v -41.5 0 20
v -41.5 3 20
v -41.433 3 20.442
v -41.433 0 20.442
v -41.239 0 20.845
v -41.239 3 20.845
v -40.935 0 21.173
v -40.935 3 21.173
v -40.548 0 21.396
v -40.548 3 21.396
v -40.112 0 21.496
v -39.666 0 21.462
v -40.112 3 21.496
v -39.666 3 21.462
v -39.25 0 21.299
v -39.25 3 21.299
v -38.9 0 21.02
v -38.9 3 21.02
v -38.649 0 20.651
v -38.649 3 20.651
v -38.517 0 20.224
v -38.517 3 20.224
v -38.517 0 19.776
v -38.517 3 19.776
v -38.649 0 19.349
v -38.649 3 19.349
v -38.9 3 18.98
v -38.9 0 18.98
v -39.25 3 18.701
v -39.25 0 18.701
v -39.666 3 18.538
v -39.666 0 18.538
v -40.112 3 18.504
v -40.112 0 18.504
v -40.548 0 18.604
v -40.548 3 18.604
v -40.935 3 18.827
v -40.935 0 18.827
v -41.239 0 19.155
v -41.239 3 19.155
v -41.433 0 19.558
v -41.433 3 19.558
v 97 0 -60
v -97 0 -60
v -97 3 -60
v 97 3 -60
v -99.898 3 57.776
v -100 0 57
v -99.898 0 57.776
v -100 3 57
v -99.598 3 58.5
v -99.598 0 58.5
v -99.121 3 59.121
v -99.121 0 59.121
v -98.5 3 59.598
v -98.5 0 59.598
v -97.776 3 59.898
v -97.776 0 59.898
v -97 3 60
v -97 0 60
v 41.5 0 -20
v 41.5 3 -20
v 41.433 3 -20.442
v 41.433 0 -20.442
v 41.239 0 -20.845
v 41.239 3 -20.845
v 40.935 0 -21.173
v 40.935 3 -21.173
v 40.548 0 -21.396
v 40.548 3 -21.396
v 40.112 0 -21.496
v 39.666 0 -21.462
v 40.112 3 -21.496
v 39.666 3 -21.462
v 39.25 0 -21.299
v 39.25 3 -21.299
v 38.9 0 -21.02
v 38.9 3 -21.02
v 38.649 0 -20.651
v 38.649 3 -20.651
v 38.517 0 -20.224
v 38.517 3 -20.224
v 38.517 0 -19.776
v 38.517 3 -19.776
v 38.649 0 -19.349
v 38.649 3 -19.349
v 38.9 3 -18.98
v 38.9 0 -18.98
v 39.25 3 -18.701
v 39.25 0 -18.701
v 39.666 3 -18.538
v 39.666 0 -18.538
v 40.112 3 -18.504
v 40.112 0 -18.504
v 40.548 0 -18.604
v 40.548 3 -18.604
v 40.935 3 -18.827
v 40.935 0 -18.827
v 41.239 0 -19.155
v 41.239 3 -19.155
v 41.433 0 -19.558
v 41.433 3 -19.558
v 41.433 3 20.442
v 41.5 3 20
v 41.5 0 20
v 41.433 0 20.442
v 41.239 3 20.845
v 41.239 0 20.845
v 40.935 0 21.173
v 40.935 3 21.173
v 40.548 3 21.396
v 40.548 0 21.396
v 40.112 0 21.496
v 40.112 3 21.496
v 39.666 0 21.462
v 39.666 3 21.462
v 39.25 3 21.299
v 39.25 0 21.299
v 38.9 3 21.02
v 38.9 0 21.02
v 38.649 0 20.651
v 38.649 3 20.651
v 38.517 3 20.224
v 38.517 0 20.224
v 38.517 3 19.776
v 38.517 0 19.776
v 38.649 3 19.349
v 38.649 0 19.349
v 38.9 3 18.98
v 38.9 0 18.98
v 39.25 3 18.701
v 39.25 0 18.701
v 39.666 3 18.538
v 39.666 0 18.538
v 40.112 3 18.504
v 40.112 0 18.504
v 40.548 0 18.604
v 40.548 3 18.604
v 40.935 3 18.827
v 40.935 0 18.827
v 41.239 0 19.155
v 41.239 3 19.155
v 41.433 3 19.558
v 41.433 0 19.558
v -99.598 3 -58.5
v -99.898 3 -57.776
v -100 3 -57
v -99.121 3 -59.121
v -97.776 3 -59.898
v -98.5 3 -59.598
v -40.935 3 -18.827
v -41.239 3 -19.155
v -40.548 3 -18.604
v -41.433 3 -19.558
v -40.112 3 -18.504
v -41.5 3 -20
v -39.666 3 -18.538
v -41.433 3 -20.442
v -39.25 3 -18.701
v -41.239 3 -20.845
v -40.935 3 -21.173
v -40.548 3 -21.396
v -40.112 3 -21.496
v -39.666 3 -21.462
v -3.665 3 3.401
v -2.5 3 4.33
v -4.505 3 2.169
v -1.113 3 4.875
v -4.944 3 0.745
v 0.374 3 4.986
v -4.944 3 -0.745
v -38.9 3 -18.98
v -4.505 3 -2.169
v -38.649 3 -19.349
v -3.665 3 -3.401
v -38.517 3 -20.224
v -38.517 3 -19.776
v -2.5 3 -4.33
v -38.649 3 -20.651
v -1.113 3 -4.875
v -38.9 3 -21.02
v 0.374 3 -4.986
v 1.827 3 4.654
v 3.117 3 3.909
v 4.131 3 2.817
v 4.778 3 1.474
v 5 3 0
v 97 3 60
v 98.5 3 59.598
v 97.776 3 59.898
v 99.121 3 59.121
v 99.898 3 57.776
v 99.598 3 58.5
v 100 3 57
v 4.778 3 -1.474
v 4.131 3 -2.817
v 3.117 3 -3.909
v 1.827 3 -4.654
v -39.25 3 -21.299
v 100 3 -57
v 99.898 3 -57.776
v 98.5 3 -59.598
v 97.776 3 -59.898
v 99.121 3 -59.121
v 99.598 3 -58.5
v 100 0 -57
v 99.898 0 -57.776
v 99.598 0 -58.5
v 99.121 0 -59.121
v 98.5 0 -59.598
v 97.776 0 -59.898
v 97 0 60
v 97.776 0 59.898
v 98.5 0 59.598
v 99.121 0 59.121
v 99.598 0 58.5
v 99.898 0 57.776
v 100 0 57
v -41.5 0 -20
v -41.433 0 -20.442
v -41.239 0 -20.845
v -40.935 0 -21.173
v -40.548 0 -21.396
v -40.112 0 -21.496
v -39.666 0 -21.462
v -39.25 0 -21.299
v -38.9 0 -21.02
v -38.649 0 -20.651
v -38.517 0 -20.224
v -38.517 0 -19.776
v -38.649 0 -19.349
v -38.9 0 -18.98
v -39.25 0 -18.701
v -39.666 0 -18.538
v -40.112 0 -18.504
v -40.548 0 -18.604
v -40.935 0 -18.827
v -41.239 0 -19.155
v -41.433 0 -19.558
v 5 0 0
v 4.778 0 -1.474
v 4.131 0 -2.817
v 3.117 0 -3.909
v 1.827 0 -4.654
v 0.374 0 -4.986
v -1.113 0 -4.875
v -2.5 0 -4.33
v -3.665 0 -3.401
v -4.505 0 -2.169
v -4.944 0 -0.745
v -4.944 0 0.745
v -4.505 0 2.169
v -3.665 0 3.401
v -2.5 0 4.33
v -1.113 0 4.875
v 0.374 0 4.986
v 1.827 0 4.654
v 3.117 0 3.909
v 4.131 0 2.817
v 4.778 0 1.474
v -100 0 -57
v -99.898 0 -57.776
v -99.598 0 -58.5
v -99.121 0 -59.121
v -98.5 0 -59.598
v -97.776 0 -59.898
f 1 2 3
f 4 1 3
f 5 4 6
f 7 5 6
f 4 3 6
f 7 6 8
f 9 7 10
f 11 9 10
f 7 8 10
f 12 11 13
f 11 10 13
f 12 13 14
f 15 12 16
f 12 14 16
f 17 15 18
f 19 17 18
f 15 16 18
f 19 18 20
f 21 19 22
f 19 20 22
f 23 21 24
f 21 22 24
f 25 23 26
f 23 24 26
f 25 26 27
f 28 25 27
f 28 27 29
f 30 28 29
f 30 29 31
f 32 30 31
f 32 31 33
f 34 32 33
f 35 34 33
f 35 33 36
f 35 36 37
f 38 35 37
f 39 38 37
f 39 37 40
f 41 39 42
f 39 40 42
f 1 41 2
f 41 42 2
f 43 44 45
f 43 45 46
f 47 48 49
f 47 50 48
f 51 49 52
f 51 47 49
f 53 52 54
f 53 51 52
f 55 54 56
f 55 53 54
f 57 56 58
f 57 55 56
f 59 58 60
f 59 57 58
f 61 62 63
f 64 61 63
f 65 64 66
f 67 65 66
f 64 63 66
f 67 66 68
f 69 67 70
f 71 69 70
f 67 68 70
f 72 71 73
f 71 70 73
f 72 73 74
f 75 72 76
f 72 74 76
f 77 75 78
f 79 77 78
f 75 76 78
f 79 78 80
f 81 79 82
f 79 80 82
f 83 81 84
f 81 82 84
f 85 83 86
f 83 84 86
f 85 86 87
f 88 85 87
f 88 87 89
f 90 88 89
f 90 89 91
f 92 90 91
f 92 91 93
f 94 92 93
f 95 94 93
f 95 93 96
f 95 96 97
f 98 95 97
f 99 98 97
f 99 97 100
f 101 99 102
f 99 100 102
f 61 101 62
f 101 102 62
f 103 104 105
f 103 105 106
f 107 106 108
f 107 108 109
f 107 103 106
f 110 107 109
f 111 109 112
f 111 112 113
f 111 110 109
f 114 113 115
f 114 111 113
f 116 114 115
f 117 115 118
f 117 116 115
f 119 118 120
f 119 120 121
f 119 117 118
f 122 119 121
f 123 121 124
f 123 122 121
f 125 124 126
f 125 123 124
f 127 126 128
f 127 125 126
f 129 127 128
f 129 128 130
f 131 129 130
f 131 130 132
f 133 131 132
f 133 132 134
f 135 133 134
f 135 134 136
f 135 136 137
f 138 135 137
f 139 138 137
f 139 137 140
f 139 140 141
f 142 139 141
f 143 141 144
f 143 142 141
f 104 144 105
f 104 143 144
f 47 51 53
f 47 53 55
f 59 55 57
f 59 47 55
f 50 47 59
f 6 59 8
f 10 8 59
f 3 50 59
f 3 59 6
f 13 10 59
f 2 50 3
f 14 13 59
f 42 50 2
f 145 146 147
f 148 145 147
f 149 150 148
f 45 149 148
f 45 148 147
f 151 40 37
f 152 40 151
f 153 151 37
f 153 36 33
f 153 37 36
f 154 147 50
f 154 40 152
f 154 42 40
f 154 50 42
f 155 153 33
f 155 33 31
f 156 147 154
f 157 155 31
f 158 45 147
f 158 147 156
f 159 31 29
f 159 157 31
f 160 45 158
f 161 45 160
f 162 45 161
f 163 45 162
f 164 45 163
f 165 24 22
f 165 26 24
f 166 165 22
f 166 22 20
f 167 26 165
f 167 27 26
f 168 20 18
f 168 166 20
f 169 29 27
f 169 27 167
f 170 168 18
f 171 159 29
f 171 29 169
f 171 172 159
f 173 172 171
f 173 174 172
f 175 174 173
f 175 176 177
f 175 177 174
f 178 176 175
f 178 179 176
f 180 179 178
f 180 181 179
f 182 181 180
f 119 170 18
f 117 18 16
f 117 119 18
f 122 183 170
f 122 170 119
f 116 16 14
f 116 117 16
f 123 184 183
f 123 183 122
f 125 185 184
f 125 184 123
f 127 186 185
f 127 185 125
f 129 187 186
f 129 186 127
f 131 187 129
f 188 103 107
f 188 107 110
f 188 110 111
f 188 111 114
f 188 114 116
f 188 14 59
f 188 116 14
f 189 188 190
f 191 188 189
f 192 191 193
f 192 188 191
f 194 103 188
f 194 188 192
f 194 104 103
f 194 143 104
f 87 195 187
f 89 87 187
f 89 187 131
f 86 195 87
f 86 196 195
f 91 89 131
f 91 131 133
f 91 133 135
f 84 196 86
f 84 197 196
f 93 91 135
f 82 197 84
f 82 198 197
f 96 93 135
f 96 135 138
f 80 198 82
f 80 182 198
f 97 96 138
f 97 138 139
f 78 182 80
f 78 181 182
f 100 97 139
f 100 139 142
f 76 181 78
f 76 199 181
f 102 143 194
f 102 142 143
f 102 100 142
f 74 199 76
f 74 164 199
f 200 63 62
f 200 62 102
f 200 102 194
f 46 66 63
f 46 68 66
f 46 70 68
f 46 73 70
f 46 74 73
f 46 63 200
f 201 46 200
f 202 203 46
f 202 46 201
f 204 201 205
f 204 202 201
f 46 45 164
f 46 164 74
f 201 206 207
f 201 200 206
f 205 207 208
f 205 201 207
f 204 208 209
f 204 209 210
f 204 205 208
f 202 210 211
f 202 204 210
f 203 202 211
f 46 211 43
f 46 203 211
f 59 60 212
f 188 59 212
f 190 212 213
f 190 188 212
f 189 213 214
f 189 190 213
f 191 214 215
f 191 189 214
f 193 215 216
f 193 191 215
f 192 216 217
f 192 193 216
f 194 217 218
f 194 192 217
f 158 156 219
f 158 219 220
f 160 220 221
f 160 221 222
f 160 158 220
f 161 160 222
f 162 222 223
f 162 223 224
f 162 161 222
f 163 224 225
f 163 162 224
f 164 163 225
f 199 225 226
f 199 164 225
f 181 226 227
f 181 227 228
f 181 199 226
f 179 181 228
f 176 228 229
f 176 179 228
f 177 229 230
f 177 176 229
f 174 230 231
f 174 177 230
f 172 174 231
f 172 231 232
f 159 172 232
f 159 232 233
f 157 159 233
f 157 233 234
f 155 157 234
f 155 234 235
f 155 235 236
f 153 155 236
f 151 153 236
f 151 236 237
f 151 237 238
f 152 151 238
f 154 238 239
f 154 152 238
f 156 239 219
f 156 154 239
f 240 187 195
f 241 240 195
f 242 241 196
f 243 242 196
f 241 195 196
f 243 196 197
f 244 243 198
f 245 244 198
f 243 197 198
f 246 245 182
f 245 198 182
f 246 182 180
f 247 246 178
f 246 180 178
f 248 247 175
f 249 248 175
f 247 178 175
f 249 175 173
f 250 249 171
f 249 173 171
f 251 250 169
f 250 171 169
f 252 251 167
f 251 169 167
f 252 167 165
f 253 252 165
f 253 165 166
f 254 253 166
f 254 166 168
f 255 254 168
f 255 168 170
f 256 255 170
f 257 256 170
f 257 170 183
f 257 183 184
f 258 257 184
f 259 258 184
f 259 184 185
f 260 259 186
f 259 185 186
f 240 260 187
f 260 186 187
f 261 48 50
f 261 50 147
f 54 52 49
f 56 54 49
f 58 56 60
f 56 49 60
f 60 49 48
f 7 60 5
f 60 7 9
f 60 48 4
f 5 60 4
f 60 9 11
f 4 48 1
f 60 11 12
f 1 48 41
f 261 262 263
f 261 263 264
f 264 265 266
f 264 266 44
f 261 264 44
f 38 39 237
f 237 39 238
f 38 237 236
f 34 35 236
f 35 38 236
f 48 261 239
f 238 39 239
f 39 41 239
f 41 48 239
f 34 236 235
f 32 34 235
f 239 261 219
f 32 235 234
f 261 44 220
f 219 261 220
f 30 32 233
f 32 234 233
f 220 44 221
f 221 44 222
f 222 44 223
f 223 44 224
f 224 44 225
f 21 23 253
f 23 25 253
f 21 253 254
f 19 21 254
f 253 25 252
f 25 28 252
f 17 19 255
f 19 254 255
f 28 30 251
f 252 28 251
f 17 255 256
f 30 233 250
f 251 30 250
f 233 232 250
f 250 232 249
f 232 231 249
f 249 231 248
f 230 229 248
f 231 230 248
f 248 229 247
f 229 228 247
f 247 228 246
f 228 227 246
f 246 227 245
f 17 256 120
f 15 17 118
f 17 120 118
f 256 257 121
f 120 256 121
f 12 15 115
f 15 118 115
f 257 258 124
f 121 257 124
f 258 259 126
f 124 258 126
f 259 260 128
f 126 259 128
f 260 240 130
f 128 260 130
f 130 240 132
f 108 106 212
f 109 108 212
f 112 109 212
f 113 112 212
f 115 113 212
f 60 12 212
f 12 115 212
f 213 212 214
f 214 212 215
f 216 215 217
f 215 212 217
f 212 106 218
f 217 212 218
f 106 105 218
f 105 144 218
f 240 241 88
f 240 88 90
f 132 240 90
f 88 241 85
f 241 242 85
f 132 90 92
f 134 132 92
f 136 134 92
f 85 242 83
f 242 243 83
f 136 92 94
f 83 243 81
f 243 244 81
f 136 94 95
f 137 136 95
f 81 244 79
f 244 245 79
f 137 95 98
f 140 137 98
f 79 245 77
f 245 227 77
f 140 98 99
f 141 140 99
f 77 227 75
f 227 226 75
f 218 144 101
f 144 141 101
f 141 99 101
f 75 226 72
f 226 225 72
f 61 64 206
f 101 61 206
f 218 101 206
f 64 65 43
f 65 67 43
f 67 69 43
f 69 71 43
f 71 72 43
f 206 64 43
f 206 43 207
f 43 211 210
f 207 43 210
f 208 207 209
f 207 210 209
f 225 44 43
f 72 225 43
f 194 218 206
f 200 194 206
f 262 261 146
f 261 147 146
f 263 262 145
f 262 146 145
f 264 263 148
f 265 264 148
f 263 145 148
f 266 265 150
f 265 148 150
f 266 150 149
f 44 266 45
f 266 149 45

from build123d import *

# Parameters (mm, degrees)
SKETCH1_W               = 200
SKETCH1_H               = 120
BOSS_EXTRUDE1_DEPTH     = 3
FILLET1_R               = 3
SKETCH2_R               = 1.5
CUT_EXTRUDE1_DEPTH      = 3
MIRROR2_COPY_1_SKETCH_R = 1.5
MIRROR2_COPY_1_DEPTH    = 3
SKETCH3_R               = 5
CUT_EXTRUDE2_DEPTH      = 3


with BuildPart() as part:
    # Sketch1 → Boss-Extrude1 (new body)
    with BuildSketch(Plane(origin=(0, 0, 0), x_dir=(1, 0, 0), z_dir=(0, 1, 0))):
        Rectangle(SKETCH1_W, SKETCH1_H)
    extrude(amount=BOSS_EXTRUDE1_DEPTH)

    # Fillet1
    fillet1_edges = [part.edges().sort_by_distance(p)[0] for p in [
        (100, 1.5, 60),
        (-100, 1.5, 60),
        (-100, 1.5, -60),
        (100, 1.5, -60),
    ]]
    fillet(fillet1_edges, radius=FILLET1_R)

    # Sketch2 → Cut-Extrude1 (cut)
    with BuildSketch(Plane(origin=(0, 3, 0), x_dir=(1, 0, 0), z_dir=(0, 1, 0))):
        with Locations((40, 20)):
            Circle(SKETCH2_R)
    cut_extrude1 = extrude(amount=-CUT_EXTRUDE1_DEPTH, mode=Mode.SUBTRACT)

    # Mirror1: Cut-Extrude1 across plane
    add(cut_extrude1.mirror(Plane.XY), mode=Mode.SUBTRACT)

    # Mirror2: Cut-Extrude1 across plane
    add(cut_extrude1.mirror(Plane(origin=(0, 0, 0), x_dir=(0, 0, 1), z_dir=(1, 0, 0))), mode=Mode.SUBTRACT)

    # Mirror2 copy 1 sketch → Mirror2 copy 1 (cut)
    with BuildSketch(Plane(origin=(0, 3, 0), x_dir=(-1, 0, 0), z_dir=(0, 1, 0))):
        with Locations((40, 20)):
            Circle(MIRROR2_COPY_1_SKETCH_R)
    extrude(amount=-MIRROR2_COPY_1_DEPTH, mode=Mode.SUBTRACT)

    # Sketch3 → Cut-Extrude2 (cut)
    with BuildSketch(Plane(origin=(0, 3, 0), x_dir=(1, 0, 0), z_dir=(0, 1, 0))):
        Circle(SKETCH3_R)
    extrude(amount=-CUT_EXTRUDE2_DEPTH, mode=Mode.SUBTRACT)


solid = part.part
